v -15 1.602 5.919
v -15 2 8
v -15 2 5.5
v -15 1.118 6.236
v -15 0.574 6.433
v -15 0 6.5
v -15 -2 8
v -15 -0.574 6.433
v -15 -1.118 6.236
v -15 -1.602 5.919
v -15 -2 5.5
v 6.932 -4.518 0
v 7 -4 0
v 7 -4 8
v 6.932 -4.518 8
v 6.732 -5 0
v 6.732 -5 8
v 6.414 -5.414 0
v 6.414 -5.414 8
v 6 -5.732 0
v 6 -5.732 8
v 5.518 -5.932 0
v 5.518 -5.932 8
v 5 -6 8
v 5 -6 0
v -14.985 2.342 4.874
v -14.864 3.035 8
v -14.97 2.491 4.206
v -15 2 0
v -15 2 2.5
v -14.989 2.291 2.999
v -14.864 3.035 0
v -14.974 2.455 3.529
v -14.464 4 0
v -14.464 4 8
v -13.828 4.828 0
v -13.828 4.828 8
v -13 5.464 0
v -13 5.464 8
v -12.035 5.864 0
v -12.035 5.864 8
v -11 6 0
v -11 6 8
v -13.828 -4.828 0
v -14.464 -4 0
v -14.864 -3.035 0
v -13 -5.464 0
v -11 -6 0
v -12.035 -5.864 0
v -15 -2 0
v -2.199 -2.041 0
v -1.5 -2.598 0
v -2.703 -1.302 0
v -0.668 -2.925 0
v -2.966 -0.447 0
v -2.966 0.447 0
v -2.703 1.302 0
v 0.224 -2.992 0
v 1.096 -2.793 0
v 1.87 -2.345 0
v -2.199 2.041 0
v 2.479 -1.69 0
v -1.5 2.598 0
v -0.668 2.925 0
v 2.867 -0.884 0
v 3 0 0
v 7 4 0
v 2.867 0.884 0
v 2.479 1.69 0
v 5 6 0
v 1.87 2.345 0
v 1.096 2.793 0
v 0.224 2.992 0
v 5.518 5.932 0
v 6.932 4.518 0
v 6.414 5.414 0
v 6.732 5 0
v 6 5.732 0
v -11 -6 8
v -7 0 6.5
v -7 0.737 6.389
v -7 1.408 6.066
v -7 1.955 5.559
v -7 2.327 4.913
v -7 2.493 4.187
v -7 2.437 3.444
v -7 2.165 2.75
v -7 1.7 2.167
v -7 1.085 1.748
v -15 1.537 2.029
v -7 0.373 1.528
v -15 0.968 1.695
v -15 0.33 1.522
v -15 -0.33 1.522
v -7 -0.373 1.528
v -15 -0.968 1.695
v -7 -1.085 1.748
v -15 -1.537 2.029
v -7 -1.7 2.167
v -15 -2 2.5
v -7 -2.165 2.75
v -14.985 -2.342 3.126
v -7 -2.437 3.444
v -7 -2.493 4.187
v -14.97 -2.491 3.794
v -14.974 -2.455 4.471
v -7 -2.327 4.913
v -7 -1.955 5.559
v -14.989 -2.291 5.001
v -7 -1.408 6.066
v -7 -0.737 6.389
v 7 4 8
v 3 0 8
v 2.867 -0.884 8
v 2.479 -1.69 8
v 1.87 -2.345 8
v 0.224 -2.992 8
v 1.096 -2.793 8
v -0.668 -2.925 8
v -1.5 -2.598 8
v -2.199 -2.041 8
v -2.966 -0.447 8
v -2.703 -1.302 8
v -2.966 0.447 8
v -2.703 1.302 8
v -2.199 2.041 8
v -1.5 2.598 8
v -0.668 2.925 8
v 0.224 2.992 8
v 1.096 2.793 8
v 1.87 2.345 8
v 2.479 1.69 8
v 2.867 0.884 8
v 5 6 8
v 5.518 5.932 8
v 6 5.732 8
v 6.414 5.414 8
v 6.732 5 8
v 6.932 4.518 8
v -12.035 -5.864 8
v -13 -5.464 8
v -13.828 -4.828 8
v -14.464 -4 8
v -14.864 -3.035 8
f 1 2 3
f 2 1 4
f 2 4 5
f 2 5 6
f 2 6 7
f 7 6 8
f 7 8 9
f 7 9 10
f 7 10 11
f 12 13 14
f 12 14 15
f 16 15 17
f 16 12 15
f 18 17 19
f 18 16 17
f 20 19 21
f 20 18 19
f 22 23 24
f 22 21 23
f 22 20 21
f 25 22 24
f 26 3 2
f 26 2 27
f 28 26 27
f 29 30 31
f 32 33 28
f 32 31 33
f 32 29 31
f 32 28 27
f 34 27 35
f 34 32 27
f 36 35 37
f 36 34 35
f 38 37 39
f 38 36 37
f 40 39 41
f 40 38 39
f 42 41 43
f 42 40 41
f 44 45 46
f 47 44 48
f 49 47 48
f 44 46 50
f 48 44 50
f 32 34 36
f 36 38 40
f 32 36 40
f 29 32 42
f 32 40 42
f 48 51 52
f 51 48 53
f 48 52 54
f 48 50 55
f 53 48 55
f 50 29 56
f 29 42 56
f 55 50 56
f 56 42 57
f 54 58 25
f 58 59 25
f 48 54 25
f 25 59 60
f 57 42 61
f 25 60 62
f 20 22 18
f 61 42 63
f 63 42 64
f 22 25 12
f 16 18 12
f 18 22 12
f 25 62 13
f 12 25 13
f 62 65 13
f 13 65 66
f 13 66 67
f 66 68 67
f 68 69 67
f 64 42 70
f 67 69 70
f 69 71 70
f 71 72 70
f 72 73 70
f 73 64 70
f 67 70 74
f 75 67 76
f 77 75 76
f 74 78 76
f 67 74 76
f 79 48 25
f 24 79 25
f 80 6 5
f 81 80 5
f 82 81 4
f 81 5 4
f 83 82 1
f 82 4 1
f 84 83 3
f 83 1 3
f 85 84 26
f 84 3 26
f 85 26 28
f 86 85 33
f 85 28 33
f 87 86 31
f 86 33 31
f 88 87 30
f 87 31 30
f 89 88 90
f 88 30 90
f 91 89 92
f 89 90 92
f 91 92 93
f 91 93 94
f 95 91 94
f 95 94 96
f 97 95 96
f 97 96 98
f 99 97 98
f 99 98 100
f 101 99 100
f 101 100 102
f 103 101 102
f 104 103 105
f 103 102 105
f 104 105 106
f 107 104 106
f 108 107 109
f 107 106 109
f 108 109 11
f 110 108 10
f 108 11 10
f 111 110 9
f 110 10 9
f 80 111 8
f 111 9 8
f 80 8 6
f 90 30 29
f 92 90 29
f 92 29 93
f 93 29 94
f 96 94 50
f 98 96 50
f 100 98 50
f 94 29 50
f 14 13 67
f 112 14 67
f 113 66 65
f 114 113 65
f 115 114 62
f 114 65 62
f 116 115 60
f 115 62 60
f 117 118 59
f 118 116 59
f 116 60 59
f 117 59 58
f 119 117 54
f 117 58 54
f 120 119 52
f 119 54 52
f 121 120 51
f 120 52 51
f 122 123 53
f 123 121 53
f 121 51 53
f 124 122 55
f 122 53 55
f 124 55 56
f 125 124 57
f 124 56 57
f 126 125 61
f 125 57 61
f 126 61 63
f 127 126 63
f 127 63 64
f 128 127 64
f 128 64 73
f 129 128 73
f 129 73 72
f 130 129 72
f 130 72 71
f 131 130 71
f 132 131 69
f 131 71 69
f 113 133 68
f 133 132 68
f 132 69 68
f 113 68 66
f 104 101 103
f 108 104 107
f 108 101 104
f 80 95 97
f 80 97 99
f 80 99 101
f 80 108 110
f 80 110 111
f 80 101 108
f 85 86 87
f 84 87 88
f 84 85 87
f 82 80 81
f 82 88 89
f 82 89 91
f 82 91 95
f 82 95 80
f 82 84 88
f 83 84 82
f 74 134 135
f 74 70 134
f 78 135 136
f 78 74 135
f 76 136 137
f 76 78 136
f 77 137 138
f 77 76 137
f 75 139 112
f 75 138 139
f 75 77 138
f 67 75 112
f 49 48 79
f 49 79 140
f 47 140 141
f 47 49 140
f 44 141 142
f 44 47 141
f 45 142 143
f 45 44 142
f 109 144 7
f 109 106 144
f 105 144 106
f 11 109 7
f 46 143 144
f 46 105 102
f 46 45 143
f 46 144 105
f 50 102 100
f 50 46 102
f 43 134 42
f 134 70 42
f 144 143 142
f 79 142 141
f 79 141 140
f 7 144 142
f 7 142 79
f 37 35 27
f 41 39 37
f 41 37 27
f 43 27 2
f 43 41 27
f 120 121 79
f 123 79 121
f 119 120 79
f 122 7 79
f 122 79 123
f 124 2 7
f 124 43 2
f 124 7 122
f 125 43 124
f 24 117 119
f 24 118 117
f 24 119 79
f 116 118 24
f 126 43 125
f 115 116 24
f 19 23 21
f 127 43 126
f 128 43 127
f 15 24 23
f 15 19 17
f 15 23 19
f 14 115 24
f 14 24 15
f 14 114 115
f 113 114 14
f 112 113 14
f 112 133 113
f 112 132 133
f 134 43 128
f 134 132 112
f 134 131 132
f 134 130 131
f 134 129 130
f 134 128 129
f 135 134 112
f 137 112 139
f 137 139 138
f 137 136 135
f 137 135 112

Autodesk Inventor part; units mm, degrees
ref_plane "YZ Plane" through (0, 0, 0) normal (1, 0, 0) x (0, 1, 0)
ref_plane "XZ Plane" through (0, 0, 0) normal (0, 1, 0) x (-1, 0, 0)
ref_plane "XY Plane" through (0, 0, 0) normal (0, 0, 1) x (1, 0, 0)
sketch "Sketch1" plane through (0, 0, 0) normal (0, 0, 1) x (1, 0, 0)
  circle A0 centre (0, 0) radius 3
  line L0 (0, 0) -> (0, 6) construction
  line L1 (0, 6) -> (0, -6) construction
  line L2 (0, -6) -> (5, -6)
  line L3 (7, -4) -> (7, 4)
  line L4 (5, 6) -> (0, 6)
  line L5 (0, 6) -> (-11, 6)
  line L6 (-15, 2) -> (-15, -2)
  line L7 (-11, -6) -> (0, -6)
  arc A1 (7, 4) -> (5, 6) centre (5, 4) ccw
  arc A2 (5, -6) -> (7, -4) centre (5, -4) ccw
  arc A3 (-11, 6) -> (-15, 2) centre (-11, 2) ccw
  arc A4 (-15, -2) -> (-11, -6) centre (-11, -2) ccw
  line L8 (0, 0) -> (9, 0) construction
  line L9 (9, 0) -> (9, 8.7977) construction
  point P0 (7, -6)
  point P1 (-15, 6)
  dimension "d0" = 6
  dimension "d1" = 6
  dimension "d2" = 12
  dimension "d3" = 7
  dimension "d4" = 15
  dimension "d5" = 2
  dimension "d6" = 4
  dimension "d7" = 4
  dimension "d16" = 9
extrude "Extrusion1" add sketch "Sketch1" along normal blind 8
sketch "Sketch3" plane through (-15, -2, 0) normal (-1, 0, 0) x (0, 0, 1)
  line L0 (0, 2) -> (4, 2) construction
  circle A0 centre (4, 2) radius 2.5
  dimension "d17" = 4
  dimension "d18" = 5
extrude "Extrusion3" cut sketch "Sketch3" against normal blind 8
thread "Thread2" size "M5x0.8" class "6H" standard "ANSI Metric M Profile" length 8
equation "\"BendRadius\" = Thickness"
equation "\"BendReliefWidth\" = Thickness"
equation "\"BendReliefDepth\" = 0.5 * Thickness"
equation "\"CornerReliefSize\" = 4 * Thickness"
equation "\"MinimumRemnant\" = 2 * Thickness"
equation "\"TransitionRadius\" = BendRadius"
equation "\"JacobiRadiusSize\" = BendRadius"
equation "\"GapSize\" = Thickness"
equation "\"Thickness\" = 3.048"
properties part number "Mocowanie przesuwnicy" material "Stainless Steel"
